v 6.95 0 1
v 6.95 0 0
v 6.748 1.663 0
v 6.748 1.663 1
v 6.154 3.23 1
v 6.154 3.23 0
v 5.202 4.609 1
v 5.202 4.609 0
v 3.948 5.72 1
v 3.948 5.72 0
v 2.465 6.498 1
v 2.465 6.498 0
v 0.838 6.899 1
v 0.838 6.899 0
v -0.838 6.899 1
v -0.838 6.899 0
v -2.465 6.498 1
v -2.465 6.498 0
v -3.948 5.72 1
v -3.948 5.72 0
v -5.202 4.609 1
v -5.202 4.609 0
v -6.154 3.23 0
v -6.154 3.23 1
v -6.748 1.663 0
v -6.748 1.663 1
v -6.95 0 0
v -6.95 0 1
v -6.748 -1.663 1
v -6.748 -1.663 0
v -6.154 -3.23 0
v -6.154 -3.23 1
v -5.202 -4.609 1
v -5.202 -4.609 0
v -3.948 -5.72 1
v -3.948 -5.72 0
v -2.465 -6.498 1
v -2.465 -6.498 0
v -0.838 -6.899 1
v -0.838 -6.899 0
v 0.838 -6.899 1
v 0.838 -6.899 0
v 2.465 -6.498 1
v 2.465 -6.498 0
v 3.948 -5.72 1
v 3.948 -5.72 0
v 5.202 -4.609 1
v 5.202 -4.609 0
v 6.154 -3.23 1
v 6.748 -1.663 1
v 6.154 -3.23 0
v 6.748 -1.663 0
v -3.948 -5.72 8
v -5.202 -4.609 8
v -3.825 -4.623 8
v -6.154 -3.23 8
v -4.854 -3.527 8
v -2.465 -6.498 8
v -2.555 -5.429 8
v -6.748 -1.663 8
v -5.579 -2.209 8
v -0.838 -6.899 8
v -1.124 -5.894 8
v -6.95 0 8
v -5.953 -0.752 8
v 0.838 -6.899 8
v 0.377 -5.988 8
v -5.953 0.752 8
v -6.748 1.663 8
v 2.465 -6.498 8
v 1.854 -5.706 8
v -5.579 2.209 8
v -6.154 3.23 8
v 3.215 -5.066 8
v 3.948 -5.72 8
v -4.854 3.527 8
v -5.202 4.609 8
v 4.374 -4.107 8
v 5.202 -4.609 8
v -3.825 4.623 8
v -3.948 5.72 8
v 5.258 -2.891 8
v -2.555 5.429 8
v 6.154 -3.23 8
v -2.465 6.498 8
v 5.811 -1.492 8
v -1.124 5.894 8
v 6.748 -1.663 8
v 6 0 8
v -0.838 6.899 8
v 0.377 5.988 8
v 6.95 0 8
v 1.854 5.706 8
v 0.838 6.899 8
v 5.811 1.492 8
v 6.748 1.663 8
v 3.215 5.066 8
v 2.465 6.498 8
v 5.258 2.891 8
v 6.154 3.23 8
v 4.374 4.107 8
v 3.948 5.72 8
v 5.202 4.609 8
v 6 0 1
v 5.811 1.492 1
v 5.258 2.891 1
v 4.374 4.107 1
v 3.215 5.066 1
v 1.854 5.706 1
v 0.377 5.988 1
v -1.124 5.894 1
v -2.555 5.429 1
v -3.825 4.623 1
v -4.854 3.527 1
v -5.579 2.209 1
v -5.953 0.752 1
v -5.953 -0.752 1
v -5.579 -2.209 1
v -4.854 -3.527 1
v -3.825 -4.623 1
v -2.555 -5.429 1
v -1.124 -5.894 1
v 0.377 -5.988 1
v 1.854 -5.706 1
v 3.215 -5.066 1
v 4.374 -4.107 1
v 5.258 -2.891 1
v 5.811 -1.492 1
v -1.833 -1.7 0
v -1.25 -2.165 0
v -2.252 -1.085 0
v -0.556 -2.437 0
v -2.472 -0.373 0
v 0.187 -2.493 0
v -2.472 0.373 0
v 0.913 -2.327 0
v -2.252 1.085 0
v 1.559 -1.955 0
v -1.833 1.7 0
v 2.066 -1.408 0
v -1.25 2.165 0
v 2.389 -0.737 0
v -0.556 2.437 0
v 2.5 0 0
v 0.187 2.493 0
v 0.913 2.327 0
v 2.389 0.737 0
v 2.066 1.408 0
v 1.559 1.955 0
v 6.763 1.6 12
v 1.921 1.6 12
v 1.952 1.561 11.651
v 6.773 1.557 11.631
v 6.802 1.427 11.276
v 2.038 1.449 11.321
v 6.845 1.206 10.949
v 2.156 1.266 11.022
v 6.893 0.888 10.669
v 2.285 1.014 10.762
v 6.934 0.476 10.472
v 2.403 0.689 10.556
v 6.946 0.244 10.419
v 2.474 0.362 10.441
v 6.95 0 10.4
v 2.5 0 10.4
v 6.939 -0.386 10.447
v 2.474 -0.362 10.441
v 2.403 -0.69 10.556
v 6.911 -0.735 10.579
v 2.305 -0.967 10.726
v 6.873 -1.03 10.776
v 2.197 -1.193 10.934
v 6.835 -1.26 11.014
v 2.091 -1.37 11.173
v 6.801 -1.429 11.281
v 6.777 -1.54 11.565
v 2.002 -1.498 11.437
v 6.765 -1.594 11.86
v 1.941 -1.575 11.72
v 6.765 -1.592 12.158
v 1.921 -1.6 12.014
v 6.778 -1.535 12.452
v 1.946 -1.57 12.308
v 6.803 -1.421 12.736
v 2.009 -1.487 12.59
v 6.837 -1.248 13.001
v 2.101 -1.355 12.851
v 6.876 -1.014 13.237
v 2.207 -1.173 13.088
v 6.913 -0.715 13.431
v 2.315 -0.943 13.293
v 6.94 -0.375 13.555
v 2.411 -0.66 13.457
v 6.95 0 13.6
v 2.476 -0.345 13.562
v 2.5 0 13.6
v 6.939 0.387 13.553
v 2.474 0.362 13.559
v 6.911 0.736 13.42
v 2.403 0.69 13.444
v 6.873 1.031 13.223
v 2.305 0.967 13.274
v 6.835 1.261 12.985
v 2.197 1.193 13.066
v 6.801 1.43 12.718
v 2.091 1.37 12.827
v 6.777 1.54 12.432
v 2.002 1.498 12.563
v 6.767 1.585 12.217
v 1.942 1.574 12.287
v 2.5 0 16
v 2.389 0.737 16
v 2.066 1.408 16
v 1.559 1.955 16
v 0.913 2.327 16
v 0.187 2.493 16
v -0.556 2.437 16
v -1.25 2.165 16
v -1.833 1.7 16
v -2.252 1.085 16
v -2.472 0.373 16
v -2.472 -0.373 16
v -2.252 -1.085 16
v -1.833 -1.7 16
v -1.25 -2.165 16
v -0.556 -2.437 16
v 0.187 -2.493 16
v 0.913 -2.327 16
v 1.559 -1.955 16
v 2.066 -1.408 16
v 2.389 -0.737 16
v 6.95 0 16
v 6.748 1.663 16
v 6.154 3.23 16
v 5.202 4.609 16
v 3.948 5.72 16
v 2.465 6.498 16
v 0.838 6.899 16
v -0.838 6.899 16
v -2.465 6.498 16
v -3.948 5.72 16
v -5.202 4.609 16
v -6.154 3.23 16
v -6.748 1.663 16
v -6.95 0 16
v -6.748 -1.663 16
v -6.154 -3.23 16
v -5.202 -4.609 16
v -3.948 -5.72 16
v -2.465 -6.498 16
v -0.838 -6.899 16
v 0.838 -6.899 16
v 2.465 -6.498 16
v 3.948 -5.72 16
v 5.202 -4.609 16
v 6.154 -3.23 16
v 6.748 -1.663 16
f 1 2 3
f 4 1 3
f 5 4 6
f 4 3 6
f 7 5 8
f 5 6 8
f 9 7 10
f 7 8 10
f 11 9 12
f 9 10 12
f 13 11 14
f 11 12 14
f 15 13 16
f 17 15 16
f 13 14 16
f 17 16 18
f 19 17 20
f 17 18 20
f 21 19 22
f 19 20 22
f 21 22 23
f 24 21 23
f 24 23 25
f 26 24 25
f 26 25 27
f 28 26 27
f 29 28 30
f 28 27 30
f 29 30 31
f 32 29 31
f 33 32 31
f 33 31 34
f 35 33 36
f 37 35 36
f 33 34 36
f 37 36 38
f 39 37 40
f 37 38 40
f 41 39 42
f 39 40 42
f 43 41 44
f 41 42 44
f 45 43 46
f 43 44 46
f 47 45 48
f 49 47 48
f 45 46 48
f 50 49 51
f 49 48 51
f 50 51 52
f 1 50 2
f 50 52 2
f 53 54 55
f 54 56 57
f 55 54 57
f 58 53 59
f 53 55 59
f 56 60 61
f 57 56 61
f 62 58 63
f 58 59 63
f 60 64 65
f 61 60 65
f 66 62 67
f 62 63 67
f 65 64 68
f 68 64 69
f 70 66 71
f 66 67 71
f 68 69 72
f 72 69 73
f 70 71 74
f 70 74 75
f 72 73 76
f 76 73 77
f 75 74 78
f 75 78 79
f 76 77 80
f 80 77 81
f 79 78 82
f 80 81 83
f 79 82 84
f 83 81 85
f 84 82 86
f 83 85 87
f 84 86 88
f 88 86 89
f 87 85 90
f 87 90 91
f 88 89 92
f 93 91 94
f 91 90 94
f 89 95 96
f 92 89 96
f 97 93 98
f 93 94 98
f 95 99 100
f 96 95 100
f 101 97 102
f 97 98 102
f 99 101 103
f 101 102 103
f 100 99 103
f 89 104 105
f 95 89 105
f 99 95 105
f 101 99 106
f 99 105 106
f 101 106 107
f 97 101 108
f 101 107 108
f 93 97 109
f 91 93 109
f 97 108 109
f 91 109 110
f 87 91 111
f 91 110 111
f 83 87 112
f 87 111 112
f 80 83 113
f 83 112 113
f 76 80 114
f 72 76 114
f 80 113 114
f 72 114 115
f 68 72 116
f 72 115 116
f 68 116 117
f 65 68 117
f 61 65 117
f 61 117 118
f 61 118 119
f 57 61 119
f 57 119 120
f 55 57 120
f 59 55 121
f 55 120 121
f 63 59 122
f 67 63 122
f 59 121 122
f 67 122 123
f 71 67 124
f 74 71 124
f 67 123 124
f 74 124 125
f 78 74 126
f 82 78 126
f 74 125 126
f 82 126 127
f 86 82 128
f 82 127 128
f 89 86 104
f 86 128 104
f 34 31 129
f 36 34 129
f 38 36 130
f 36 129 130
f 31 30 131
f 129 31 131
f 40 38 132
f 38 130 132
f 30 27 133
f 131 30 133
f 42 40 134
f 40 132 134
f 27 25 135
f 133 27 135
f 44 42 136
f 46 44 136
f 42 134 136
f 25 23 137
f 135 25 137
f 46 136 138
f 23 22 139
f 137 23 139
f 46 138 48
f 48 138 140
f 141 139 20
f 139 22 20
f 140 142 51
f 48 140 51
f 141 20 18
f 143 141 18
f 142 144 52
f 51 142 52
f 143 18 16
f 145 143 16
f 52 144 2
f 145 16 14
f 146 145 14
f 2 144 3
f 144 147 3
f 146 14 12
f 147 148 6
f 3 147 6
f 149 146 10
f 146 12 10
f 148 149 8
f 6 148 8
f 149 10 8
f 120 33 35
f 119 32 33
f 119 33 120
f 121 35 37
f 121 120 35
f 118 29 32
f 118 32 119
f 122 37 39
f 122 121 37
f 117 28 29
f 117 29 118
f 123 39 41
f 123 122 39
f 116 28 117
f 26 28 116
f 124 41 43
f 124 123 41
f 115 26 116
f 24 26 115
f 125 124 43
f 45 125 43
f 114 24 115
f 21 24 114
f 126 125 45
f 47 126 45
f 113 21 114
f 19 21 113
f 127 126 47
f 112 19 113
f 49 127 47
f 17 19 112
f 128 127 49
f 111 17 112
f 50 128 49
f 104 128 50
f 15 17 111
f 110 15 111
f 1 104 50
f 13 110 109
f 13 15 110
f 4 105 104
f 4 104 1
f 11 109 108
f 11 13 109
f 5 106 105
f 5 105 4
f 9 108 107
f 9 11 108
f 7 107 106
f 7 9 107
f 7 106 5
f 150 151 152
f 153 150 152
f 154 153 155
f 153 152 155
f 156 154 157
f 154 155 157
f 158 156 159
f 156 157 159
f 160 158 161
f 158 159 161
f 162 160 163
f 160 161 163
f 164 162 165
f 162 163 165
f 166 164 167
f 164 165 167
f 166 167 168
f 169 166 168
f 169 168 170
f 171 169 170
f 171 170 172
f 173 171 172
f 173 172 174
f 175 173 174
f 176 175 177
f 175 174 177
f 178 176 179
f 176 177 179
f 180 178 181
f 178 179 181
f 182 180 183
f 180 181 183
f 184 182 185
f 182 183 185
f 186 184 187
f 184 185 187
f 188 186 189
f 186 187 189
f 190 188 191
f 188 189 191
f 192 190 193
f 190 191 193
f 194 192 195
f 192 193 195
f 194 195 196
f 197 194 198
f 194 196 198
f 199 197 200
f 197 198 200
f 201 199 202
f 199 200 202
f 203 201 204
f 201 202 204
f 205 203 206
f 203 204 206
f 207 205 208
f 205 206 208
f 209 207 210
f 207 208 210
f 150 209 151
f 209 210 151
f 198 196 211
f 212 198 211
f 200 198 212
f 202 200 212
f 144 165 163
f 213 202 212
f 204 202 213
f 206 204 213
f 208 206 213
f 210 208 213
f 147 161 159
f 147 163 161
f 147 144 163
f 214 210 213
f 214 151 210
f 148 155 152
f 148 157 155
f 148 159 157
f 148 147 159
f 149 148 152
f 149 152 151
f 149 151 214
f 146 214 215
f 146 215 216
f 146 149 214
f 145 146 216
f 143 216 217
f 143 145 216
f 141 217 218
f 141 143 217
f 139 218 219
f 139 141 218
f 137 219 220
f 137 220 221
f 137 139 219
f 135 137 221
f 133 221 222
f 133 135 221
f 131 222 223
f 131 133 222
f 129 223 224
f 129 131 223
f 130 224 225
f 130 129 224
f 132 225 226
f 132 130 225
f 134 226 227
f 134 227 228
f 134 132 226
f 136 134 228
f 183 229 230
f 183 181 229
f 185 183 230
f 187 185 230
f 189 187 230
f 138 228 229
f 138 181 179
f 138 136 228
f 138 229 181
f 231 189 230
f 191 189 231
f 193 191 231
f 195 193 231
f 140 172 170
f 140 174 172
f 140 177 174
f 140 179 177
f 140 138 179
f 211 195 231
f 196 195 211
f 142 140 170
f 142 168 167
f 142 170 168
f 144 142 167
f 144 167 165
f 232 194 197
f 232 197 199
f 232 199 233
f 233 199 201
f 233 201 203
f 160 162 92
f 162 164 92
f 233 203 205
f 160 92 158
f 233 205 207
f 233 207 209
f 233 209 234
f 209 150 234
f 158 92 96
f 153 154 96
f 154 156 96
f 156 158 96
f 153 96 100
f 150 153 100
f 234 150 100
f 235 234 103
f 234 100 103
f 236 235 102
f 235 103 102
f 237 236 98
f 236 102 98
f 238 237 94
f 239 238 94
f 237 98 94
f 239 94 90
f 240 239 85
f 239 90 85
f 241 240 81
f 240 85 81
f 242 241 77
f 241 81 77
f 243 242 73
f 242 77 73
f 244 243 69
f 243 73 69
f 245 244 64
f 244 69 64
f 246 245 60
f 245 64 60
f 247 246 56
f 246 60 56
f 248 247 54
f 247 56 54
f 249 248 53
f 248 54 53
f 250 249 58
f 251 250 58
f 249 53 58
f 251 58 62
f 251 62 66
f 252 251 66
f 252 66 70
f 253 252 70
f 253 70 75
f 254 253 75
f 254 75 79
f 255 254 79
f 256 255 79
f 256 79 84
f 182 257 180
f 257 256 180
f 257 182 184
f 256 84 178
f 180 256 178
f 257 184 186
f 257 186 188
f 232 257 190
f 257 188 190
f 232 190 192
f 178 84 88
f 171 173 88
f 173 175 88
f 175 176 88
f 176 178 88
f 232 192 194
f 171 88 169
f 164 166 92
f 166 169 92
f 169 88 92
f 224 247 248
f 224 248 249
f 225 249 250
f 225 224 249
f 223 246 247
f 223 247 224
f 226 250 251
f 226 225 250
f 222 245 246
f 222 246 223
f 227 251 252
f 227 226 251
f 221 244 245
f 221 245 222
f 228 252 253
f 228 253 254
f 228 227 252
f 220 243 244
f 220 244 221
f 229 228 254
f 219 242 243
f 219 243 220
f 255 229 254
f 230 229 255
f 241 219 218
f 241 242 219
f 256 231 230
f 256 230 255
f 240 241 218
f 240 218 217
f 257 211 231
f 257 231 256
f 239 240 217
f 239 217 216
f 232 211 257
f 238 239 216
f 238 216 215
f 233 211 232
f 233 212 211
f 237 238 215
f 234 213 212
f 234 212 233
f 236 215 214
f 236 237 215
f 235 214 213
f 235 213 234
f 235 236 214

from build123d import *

# Parameters (mm, degrees)
F0_R     = 6.95
F0_R_2   = 6
F0_R_3   = 4.875
F0_R_4   = 2.5
F1_DEPTH = 1
F2_START = 1
F2_DEPTH = 7
F3_START = 8
F3_DEPTH = 1
F4_START = 9
F4_DEPTH = 7
F6_D     = 3.2
F6_DEPTH = 6.951


with BuildPart() as f1:
    # F0 (on Top) → F1 (new body)
    with BuildSketch(Plane.XY):
        Circle(F0_R)
        Circle(F0_R_2, mode=Mode.SUBTRACT)
        Circle(F0_R_2)
        Circle(F0_R_3, mode=Mode.SUBTRACT)
        Circle(F0_R_3)
        Circle(F0_R_4, mode=Mode.SUBTRACT)
    extrude(amount=F1_DEPTH)

    # F0 (on Top) → F2 (join)
    with BuildSketch(Plane.XY.offset(F2_START)):
        Circle(F0_R_2)
        Circle(F0_R_3, mode=Mode.SUBTRACT)
        Circle(F0_R_3)
        Circle(F0_R_4, mode=Mode.SUBTRACT)
    extrude(amount=F2_DEPTH)

    # F0 (on Top) → F3 (join)
    with BuildSketch(Plane.XY.offset(F3_START)):
        Circle(F0_R)
        Circle(F0_R_2, mode=Mode.SUBTRACT)
        Circle(F0_R_2)
        Circle(F0_R_3, mode=Mode.SUBTRACT)
        Circle(F0_R_3)
        Circle(F0_R_4, mode=Mode.SUBTRACT)
    extrude(amount=F3_DEPTH)

    # F0 (on Top) → F4 (join)
    with BuildSketch(Plane.XY.offset(F4_START)):
        Circle(F0_R)
        Circle(F0_R_2, mode=Mode.SUBTRACT)
        Circle(F0_R_2)
        Circle(F0_R_3, mode=Mode.SUBTRACT)
        Circle(F0_R_3)
        Circle(F0_R_4, mode=Mode.SUBTRACT)
    extrude(amount=F4_DEPTH)

    # F6 (through all, one way)
    with BuildSketch(Plane(origin=(0, 0, 0), x_dir=(0, 1, 0), z_dir=(-1, 0, 0))):
        with Locations((0, -12)):
            Circle(F6_D / 2)
    extrude(amount=-F6_DEPTH, mode=Mode.SUBTRACT)


solid = f1.part
